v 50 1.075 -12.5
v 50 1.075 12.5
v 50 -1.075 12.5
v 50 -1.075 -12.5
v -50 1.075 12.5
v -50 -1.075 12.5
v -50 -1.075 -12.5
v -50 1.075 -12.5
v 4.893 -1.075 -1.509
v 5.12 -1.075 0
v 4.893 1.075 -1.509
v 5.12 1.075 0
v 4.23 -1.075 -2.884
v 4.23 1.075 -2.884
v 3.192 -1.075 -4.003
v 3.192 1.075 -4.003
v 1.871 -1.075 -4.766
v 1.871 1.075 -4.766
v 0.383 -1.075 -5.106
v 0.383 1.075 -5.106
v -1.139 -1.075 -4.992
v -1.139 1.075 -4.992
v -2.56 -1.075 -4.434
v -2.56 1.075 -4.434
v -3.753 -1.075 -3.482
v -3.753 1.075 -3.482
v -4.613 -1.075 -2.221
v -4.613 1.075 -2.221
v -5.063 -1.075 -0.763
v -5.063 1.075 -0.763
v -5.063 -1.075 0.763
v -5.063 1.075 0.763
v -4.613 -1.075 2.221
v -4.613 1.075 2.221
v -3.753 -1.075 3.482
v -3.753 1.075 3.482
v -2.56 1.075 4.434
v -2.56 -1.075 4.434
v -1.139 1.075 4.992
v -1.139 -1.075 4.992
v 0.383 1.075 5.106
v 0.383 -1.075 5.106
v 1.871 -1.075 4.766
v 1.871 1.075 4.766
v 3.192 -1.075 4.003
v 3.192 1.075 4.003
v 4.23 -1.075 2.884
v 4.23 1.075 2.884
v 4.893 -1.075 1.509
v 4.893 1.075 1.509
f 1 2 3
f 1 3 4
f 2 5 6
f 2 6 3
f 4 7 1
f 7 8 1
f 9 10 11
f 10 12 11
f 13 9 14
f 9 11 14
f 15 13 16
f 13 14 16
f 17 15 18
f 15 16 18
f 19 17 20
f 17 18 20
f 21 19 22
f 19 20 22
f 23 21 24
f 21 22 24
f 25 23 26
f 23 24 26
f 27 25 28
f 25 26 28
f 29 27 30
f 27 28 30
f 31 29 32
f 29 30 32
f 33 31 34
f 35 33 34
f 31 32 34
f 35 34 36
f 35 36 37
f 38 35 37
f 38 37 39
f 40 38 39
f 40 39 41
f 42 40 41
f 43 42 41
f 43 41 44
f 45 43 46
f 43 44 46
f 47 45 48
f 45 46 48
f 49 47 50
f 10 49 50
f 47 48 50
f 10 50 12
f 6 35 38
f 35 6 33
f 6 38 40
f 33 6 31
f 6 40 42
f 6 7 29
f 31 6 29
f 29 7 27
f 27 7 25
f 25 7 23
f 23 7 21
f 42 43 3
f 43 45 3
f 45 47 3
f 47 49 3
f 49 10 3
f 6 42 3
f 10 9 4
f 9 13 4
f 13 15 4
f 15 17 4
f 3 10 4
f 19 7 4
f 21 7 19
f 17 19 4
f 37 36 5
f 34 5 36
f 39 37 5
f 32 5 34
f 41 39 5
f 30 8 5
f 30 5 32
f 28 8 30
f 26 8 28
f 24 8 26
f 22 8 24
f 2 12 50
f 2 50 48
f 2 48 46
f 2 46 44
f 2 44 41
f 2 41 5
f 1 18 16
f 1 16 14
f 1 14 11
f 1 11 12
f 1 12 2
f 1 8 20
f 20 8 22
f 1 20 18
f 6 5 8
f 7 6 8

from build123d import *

# Parameters (mm, degrees)
SKETCH1_W                = 100
SKETCH1_H                = 25
BOSS_EXTRUDE1_DEPTH      = 1.075
BOSS_EXTRUDE1_DEPTH_BACK = 1.075
SKETCH2_R                = 5.12
CUT_EXTRUDE1_DEPTH       = 2.075
CUT_EXTRUDE1_DEPTH_BACK  = 2.075


with BuildPart() as part:
    # Sketch1 → Boss-Extrude1 (new body, two sides)
    with BuildSketch(Plane(origin=(0, 0, 0), x_dir=(1, 0, 0), z_dir=(0, 1, 0))) as boss_extrude1_sk:
        Rectangle(SKETCH1_W, SKETCH1_H)
    extrude(amount=BOSS_EXTRUDE1_DEPTH)
    extrude(boss_extrude1_sk.sketch, amount=-BOSS_EXTRUDE1_DEPTH_BACK)

    # Sketch2 → Cut-Extrude1 (cut, two sides)
    with BuildSketch(Plane(origin=(0, 0, 0), x_dir=(1, 0, 0), z_dir=(0, 1, 0))) as cut_extrude1_sk:
        Circle(SKETCH2_R)
    extrude(amount=CUT_EXTRUDE1_DEPTH, mode=Mode.SUBTRACT)
    extrude(cut_extrude1_sk.sketch, amount=-CUT_EXTRUDE1_DEPTH_BACK, mode=Mode.SUBTRACT)


solid = part.part
